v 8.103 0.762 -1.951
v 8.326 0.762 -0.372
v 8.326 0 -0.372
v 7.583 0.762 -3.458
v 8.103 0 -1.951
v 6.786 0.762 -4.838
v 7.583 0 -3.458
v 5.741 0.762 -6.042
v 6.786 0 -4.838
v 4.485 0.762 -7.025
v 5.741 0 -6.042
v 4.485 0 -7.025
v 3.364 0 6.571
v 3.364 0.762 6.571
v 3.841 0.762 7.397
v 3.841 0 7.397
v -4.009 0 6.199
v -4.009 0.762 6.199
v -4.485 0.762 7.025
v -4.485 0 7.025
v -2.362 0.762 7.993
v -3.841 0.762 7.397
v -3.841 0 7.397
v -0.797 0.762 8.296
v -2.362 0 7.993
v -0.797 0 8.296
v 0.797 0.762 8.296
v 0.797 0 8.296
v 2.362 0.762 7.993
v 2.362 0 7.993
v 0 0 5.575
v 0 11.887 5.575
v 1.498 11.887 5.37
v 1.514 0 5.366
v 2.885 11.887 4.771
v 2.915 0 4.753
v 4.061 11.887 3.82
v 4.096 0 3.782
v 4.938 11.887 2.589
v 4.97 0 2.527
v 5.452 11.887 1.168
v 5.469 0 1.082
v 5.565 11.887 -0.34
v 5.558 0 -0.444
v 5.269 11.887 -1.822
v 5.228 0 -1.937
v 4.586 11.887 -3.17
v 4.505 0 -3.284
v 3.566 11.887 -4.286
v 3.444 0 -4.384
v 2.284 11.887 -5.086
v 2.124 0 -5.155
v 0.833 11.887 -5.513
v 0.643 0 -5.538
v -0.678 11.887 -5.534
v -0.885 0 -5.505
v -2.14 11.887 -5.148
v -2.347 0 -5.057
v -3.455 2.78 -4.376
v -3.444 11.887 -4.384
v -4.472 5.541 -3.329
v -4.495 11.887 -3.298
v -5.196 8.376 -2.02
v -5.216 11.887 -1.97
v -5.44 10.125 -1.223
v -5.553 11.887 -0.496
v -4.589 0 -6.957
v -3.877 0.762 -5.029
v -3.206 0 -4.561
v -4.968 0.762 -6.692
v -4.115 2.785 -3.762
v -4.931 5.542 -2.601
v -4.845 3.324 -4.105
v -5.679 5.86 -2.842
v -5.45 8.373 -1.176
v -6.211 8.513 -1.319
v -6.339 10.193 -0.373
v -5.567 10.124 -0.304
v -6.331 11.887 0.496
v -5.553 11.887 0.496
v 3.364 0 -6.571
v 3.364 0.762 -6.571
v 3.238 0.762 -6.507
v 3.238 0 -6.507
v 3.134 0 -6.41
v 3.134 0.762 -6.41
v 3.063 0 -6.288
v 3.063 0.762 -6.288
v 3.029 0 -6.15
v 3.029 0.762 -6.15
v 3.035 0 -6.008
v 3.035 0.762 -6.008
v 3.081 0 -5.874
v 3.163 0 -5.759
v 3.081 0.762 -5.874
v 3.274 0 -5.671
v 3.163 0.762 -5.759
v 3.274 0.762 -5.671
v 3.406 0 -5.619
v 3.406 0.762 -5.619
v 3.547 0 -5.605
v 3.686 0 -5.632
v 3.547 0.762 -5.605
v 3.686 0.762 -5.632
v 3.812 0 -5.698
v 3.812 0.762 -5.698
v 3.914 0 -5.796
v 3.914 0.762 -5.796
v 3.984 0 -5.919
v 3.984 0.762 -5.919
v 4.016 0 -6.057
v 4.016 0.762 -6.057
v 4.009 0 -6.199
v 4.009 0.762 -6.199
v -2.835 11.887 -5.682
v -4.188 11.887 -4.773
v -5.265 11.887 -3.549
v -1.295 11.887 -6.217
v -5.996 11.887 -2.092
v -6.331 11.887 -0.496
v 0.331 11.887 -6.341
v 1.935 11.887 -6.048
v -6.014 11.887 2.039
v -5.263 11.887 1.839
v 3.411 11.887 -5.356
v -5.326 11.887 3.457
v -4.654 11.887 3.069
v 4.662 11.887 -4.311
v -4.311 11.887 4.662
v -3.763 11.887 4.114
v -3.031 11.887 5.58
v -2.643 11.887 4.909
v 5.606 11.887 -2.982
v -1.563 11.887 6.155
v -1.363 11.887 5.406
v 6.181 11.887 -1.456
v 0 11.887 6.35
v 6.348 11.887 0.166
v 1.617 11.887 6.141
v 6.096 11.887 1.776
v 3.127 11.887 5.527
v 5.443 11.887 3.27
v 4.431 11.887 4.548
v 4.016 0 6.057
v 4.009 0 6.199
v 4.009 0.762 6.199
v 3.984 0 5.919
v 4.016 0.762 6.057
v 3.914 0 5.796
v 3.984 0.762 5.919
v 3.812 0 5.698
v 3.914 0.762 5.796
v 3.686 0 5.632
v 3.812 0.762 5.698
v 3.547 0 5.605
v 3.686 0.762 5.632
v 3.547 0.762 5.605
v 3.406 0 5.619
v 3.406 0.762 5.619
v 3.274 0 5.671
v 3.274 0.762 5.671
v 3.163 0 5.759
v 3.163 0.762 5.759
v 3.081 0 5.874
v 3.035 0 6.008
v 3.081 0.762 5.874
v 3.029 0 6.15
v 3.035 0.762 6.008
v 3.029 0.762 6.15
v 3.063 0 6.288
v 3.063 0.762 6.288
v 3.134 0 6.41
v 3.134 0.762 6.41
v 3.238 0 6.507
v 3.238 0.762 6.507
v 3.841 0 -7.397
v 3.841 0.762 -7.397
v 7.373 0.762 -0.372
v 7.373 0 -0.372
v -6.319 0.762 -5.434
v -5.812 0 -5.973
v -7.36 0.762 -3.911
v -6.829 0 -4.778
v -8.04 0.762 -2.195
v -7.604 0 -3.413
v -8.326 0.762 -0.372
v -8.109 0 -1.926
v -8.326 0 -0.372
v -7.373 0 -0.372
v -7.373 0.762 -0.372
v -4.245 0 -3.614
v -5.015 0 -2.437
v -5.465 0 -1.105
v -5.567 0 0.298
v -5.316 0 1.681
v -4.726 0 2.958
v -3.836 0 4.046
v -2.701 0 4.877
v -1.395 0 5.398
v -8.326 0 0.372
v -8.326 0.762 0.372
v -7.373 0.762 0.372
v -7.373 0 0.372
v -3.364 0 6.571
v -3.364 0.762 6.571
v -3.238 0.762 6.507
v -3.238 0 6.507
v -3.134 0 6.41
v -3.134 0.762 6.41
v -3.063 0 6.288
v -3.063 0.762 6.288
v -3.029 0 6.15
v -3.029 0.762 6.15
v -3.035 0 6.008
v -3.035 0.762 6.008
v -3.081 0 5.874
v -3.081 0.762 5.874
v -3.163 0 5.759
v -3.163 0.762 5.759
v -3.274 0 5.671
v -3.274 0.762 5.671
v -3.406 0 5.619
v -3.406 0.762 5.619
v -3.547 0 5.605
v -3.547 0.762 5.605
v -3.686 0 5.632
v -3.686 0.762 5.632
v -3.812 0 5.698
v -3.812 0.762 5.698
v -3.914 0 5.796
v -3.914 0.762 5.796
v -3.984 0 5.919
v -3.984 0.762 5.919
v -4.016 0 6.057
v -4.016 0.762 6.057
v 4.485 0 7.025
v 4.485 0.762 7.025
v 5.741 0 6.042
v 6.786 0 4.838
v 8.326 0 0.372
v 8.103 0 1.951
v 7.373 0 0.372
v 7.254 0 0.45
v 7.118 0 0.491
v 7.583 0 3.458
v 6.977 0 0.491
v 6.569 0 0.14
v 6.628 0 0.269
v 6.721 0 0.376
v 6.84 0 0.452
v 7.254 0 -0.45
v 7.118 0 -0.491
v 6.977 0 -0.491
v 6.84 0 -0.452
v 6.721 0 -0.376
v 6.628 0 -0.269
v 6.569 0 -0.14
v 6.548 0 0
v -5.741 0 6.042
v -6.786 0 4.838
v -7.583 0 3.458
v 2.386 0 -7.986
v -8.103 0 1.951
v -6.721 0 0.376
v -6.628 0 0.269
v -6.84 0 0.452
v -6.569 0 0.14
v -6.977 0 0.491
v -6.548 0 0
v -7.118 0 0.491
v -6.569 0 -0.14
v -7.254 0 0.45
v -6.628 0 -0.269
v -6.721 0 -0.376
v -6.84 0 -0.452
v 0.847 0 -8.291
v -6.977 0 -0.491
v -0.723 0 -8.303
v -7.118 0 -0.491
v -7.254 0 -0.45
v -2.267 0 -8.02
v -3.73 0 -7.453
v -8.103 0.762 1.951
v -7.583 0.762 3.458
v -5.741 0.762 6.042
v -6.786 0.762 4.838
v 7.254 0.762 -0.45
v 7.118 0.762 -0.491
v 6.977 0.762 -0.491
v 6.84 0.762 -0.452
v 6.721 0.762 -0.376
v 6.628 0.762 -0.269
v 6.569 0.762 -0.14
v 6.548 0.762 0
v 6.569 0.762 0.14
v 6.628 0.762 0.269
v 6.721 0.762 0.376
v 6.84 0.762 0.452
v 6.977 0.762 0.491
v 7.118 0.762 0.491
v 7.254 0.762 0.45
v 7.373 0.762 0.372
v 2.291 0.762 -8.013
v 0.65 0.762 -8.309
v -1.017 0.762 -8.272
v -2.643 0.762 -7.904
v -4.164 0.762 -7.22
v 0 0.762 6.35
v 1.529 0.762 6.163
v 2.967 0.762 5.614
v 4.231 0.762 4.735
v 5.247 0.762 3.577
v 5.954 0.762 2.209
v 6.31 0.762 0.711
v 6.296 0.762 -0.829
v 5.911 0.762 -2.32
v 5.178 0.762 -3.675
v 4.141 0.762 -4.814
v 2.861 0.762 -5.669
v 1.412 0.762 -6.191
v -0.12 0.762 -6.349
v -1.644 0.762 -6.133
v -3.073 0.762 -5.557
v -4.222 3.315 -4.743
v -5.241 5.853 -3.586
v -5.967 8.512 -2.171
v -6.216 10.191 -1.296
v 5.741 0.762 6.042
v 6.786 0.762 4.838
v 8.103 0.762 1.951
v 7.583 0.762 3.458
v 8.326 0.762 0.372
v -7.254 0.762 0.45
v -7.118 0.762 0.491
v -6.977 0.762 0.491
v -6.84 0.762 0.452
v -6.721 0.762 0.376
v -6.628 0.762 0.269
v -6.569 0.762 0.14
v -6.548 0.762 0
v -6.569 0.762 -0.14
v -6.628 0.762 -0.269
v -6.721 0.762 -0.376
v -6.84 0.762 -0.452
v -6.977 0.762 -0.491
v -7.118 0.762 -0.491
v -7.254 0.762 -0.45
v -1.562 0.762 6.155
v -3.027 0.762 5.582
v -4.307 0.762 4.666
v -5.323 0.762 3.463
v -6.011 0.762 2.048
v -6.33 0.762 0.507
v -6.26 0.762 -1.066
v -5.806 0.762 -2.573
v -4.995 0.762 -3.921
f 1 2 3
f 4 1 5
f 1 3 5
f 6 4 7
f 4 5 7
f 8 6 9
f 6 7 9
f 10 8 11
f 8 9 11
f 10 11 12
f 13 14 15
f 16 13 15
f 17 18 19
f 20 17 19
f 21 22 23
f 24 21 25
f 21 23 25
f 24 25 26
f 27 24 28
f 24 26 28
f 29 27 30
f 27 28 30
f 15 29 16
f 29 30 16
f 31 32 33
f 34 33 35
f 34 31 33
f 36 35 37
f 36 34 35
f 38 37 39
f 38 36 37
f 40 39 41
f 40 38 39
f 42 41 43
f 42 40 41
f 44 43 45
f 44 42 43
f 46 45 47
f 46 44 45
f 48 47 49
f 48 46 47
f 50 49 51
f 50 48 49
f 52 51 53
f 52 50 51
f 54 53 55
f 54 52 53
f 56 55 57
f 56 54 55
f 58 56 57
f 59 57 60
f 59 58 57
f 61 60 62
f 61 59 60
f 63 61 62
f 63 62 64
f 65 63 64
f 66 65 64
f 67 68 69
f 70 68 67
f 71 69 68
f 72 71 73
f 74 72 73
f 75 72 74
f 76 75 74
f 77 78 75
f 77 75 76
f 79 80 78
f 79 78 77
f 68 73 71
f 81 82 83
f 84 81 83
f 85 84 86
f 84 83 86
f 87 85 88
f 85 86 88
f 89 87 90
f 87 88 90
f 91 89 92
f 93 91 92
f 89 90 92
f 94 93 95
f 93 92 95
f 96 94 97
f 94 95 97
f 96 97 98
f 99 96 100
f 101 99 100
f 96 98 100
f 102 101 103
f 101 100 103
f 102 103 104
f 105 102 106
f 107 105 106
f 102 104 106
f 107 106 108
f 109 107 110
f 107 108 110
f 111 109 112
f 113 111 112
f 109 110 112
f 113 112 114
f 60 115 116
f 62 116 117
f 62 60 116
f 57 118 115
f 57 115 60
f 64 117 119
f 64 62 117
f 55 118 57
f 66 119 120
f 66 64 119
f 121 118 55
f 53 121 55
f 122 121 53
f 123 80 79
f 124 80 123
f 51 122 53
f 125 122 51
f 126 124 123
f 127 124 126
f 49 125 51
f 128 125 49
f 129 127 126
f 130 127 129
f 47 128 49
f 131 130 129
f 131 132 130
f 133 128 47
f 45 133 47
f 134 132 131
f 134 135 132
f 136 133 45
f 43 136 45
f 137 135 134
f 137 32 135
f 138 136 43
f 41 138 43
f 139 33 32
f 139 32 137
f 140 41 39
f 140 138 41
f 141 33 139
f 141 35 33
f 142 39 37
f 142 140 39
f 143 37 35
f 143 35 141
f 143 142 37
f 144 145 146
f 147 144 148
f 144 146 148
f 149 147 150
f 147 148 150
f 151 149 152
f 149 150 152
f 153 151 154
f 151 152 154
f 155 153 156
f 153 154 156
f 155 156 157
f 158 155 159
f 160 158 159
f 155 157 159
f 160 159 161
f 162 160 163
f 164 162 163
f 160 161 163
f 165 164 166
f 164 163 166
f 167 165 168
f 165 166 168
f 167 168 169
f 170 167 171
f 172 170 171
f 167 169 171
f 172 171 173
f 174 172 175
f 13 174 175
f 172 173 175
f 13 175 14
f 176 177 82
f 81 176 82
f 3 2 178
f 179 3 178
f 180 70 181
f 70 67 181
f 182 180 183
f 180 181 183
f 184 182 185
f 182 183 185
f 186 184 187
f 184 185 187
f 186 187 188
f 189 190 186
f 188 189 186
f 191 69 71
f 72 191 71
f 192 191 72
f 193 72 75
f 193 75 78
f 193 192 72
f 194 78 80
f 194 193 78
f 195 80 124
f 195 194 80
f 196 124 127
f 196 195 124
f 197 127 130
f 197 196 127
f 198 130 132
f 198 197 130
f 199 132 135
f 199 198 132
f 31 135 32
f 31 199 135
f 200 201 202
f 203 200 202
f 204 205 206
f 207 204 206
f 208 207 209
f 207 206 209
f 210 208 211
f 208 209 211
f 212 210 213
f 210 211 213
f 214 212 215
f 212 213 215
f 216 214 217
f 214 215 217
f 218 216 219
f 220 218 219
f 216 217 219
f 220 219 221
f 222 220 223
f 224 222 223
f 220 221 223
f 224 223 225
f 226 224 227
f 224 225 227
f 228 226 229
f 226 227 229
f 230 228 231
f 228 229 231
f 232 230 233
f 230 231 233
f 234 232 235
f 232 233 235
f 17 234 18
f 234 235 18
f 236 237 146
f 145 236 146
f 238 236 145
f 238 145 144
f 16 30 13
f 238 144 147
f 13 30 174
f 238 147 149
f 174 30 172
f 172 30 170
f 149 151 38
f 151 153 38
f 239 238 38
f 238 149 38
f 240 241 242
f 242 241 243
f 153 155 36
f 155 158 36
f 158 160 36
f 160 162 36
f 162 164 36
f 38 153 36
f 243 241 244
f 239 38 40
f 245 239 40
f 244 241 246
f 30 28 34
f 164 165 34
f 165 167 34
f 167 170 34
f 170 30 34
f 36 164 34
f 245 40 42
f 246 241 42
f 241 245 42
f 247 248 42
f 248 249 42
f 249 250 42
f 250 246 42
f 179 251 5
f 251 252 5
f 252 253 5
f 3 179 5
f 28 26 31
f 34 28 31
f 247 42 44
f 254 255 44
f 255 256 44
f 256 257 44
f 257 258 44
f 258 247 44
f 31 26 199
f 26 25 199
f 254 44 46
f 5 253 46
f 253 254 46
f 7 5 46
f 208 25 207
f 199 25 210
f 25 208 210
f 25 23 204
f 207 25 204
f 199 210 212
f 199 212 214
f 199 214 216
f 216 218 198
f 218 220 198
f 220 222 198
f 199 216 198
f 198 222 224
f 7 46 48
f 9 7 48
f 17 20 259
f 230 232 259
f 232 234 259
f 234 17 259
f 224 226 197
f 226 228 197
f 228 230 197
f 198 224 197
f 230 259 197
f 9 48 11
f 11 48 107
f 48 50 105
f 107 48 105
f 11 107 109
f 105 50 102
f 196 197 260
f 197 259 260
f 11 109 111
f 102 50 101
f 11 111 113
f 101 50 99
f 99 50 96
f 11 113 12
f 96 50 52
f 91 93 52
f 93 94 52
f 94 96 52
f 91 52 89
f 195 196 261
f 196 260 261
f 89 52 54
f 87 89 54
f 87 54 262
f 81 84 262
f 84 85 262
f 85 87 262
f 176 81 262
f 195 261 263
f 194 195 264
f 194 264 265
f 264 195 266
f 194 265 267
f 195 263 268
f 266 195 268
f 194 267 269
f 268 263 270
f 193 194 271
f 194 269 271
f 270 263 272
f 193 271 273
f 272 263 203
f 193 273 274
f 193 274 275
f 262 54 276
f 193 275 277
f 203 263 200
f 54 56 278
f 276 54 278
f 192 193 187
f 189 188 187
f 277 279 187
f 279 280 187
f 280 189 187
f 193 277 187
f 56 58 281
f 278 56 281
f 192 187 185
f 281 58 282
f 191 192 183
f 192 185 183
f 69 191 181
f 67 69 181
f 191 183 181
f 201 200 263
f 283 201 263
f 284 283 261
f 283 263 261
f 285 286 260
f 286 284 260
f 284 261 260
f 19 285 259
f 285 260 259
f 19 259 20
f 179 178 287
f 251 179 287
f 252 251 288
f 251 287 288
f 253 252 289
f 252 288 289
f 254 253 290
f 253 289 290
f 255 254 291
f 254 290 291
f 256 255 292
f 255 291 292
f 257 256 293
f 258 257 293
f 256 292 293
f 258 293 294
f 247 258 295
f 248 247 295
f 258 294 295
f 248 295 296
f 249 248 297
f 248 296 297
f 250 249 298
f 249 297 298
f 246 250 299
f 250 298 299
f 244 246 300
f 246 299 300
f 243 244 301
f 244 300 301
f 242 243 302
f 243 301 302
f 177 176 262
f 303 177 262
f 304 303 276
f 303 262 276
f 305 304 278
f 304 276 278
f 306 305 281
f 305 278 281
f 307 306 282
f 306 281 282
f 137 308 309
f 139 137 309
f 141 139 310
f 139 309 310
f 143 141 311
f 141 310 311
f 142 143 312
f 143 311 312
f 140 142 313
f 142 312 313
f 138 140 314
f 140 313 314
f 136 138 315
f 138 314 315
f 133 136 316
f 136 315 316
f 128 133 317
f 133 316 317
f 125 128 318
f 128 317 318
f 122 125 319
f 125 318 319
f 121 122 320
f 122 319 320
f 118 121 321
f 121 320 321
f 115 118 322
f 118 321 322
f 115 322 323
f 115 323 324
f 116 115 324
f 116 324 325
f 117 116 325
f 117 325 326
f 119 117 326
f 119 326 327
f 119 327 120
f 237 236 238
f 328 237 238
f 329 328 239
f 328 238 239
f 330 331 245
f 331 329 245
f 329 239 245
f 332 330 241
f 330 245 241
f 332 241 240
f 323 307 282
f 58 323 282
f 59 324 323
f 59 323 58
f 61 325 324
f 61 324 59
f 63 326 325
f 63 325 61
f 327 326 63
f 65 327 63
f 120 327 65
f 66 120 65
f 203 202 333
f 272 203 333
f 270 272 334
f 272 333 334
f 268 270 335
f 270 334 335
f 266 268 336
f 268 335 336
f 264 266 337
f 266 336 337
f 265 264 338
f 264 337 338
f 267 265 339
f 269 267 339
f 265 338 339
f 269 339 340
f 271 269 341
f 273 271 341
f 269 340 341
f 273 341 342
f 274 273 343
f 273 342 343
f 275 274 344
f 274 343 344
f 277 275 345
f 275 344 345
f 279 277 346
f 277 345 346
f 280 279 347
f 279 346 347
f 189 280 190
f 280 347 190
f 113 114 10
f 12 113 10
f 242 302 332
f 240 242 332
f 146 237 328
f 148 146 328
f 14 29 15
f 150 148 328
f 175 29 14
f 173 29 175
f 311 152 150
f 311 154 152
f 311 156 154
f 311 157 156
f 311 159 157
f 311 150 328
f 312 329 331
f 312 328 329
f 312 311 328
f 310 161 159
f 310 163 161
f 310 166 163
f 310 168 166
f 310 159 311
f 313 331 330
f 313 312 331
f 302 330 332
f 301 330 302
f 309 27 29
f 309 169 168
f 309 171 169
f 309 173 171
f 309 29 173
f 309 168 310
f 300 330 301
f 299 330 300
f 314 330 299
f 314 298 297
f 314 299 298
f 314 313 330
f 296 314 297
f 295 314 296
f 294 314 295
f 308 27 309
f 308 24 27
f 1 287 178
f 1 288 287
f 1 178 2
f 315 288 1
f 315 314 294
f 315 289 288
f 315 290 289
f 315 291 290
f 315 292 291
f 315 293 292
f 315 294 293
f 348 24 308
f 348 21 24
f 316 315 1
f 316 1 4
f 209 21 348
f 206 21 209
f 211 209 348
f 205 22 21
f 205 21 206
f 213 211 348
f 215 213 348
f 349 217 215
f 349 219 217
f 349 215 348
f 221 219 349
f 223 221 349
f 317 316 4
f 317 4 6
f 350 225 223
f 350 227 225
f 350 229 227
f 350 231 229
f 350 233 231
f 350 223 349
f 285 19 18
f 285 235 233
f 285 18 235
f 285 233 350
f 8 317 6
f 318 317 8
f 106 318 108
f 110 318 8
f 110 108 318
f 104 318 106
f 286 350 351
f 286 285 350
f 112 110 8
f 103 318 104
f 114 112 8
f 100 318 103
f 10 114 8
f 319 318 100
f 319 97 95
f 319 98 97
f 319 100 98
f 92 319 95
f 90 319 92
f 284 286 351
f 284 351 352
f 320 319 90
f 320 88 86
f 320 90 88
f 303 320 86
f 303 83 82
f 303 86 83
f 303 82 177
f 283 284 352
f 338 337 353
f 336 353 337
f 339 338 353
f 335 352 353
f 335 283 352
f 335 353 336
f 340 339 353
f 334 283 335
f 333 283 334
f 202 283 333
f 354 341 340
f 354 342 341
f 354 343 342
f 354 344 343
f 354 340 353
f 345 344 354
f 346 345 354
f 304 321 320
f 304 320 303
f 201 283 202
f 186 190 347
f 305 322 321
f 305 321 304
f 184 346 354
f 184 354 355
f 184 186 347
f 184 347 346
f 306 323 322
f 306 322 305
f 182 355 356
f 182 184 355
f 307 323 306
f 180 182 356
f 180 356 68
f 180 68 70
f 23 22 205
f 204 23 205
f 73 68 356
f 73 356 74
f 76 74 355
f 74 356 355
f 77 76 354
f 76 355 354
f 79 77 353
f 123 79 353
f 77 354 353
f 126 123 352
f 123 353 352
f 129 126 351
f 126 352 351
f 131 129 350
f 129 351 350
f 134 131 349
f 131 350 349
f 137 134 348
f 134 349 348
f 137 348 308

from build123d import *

# Parameters (mm, degrees)
SKETCH2_R           = 6.35
SKETCH2_R_2         = 5.5753
BOSS_EXTRUDE1_DEPTH = 11.8872
SKETCH3_R           = 8.334375
SKETCH3_R_2         = 6.35
BOSS_EXTRUDE2_DEPTH = 0.762
CUT_EXTRUDE1_DEPTH  = 17.207827995
CIRPATTERN1_COUNT   = 6


with BuildPart() as part:
    # Sketch2 → Boss-Extrude1 (new body)
    with BuildSketch(Plane(origin=(0, 0, 0), x_dir=(1, 0, 0), z_dir=(0, 1, 0))):
        with Locations(Location((0, 0, 0), (0, 0, 270))):
            Circle(SKETCH2_R)
        with Locations(Location((0, 0, 0), (0, 0, 270))):
            Circle(SKETCH2_R_2, mode=Mode.SUBTRACT)
    extrude(amount=BOSS_EXTRUDE1_DEPTH)

    # Sketch3 → Boss-Extrude2 (add)
    with BuildSketch(Plane(origin=(0, 0, 0), x_dir=(1, 0, 0), z_dir=(0, 1, 0))):
        with Locations(Location((0, 0, 0), (0, 0, 90))):
            Circle(SKETCH3_R)
        with Locations(Location((0, 0, 0), (0, 0, 270))):
            Circle(SKETCH3_R_2, mode=Mode.SUBTRACT)
    extrude(amount=BOSS_EXTRUDE2_DEPTH)

    # Sketch7 → Cut-Extrude1 (cut, through all)
    with BuildSketch(Plane(origin=(0, 0.762, 0), x_dir=(1, 0, 0), z_dir=(0, 1, 0))):
        with BuildLine():
            Line((-7.372666422, 0.372070313), (-8.334375, 0.372070312))
            Line((-8.334375, 0.372070312), (-8.334375, -0.372070312))
            Line((-8.334375, -0.372070312), (-7.372666422, -0.372070313))
            ThreePointArc((-7.372666422, -0.372070313), (-6.5484375, 0), (-7.372666422, 0.372070313))
        make_face()
    cut_extrude1 = extrude(amount=-CUT_EXTRUDE1_DEPTH, mode=Mode.SUBTRACT)

    # CirPattern1: Cut-Extrude1 ×6 about axis, 1 skipped
    cirpattern1_axis = Axis((0, 11.8872, 0), (0, -1, 0))
    add([cut_extrude1.rotate(cirpattern1_axis, i * 360 / CIRPATTERN1_COUNT) for i in range(1, CIRPATTERN1_COUNT) if i not in (1,)], mode=Mode.SUBTRACT)

    # Sketch13 → Cut-Loft1 section 0
    with BuildSketch(Plane.XZ):
        with BuildLine():
            Line((-3.206222175, -4.561152207), (-5.86681729, -9.169438125))
            Line((-5.86681729, -9.169438125), (-5.00755771, -9.665531875))
            Line((-5.00755771, -9.665531875), (-2.346962594, -5.057245957))
            Line((-2.346962594, -5.057245957), (-3.206222175, -4.561152207))
        make_face()
    # Sketch12 → Cut-Loft1 section 1
    with BuildSketch(Plane(origin=(0, 11.8872, 0), x_dir=(1, 0, 0), z_dir=(0, 1, 0))):
        with BuildLine():
            Line((-10.874375, 0.49609375), (-5.553184769, 0.49609375))
            Line((-5.553184769, 0.49609375), (-5.553184769, -0.49609375))
            Line((-5.553184769, -0.49609375), (-10.874375, -0.49609375))
            Line((-10.874375, -0.49609375), (-10.874375, 0.49609375))
        make_face()
    loft(mode=Mode.SUBTRACT)


solid = part.part
